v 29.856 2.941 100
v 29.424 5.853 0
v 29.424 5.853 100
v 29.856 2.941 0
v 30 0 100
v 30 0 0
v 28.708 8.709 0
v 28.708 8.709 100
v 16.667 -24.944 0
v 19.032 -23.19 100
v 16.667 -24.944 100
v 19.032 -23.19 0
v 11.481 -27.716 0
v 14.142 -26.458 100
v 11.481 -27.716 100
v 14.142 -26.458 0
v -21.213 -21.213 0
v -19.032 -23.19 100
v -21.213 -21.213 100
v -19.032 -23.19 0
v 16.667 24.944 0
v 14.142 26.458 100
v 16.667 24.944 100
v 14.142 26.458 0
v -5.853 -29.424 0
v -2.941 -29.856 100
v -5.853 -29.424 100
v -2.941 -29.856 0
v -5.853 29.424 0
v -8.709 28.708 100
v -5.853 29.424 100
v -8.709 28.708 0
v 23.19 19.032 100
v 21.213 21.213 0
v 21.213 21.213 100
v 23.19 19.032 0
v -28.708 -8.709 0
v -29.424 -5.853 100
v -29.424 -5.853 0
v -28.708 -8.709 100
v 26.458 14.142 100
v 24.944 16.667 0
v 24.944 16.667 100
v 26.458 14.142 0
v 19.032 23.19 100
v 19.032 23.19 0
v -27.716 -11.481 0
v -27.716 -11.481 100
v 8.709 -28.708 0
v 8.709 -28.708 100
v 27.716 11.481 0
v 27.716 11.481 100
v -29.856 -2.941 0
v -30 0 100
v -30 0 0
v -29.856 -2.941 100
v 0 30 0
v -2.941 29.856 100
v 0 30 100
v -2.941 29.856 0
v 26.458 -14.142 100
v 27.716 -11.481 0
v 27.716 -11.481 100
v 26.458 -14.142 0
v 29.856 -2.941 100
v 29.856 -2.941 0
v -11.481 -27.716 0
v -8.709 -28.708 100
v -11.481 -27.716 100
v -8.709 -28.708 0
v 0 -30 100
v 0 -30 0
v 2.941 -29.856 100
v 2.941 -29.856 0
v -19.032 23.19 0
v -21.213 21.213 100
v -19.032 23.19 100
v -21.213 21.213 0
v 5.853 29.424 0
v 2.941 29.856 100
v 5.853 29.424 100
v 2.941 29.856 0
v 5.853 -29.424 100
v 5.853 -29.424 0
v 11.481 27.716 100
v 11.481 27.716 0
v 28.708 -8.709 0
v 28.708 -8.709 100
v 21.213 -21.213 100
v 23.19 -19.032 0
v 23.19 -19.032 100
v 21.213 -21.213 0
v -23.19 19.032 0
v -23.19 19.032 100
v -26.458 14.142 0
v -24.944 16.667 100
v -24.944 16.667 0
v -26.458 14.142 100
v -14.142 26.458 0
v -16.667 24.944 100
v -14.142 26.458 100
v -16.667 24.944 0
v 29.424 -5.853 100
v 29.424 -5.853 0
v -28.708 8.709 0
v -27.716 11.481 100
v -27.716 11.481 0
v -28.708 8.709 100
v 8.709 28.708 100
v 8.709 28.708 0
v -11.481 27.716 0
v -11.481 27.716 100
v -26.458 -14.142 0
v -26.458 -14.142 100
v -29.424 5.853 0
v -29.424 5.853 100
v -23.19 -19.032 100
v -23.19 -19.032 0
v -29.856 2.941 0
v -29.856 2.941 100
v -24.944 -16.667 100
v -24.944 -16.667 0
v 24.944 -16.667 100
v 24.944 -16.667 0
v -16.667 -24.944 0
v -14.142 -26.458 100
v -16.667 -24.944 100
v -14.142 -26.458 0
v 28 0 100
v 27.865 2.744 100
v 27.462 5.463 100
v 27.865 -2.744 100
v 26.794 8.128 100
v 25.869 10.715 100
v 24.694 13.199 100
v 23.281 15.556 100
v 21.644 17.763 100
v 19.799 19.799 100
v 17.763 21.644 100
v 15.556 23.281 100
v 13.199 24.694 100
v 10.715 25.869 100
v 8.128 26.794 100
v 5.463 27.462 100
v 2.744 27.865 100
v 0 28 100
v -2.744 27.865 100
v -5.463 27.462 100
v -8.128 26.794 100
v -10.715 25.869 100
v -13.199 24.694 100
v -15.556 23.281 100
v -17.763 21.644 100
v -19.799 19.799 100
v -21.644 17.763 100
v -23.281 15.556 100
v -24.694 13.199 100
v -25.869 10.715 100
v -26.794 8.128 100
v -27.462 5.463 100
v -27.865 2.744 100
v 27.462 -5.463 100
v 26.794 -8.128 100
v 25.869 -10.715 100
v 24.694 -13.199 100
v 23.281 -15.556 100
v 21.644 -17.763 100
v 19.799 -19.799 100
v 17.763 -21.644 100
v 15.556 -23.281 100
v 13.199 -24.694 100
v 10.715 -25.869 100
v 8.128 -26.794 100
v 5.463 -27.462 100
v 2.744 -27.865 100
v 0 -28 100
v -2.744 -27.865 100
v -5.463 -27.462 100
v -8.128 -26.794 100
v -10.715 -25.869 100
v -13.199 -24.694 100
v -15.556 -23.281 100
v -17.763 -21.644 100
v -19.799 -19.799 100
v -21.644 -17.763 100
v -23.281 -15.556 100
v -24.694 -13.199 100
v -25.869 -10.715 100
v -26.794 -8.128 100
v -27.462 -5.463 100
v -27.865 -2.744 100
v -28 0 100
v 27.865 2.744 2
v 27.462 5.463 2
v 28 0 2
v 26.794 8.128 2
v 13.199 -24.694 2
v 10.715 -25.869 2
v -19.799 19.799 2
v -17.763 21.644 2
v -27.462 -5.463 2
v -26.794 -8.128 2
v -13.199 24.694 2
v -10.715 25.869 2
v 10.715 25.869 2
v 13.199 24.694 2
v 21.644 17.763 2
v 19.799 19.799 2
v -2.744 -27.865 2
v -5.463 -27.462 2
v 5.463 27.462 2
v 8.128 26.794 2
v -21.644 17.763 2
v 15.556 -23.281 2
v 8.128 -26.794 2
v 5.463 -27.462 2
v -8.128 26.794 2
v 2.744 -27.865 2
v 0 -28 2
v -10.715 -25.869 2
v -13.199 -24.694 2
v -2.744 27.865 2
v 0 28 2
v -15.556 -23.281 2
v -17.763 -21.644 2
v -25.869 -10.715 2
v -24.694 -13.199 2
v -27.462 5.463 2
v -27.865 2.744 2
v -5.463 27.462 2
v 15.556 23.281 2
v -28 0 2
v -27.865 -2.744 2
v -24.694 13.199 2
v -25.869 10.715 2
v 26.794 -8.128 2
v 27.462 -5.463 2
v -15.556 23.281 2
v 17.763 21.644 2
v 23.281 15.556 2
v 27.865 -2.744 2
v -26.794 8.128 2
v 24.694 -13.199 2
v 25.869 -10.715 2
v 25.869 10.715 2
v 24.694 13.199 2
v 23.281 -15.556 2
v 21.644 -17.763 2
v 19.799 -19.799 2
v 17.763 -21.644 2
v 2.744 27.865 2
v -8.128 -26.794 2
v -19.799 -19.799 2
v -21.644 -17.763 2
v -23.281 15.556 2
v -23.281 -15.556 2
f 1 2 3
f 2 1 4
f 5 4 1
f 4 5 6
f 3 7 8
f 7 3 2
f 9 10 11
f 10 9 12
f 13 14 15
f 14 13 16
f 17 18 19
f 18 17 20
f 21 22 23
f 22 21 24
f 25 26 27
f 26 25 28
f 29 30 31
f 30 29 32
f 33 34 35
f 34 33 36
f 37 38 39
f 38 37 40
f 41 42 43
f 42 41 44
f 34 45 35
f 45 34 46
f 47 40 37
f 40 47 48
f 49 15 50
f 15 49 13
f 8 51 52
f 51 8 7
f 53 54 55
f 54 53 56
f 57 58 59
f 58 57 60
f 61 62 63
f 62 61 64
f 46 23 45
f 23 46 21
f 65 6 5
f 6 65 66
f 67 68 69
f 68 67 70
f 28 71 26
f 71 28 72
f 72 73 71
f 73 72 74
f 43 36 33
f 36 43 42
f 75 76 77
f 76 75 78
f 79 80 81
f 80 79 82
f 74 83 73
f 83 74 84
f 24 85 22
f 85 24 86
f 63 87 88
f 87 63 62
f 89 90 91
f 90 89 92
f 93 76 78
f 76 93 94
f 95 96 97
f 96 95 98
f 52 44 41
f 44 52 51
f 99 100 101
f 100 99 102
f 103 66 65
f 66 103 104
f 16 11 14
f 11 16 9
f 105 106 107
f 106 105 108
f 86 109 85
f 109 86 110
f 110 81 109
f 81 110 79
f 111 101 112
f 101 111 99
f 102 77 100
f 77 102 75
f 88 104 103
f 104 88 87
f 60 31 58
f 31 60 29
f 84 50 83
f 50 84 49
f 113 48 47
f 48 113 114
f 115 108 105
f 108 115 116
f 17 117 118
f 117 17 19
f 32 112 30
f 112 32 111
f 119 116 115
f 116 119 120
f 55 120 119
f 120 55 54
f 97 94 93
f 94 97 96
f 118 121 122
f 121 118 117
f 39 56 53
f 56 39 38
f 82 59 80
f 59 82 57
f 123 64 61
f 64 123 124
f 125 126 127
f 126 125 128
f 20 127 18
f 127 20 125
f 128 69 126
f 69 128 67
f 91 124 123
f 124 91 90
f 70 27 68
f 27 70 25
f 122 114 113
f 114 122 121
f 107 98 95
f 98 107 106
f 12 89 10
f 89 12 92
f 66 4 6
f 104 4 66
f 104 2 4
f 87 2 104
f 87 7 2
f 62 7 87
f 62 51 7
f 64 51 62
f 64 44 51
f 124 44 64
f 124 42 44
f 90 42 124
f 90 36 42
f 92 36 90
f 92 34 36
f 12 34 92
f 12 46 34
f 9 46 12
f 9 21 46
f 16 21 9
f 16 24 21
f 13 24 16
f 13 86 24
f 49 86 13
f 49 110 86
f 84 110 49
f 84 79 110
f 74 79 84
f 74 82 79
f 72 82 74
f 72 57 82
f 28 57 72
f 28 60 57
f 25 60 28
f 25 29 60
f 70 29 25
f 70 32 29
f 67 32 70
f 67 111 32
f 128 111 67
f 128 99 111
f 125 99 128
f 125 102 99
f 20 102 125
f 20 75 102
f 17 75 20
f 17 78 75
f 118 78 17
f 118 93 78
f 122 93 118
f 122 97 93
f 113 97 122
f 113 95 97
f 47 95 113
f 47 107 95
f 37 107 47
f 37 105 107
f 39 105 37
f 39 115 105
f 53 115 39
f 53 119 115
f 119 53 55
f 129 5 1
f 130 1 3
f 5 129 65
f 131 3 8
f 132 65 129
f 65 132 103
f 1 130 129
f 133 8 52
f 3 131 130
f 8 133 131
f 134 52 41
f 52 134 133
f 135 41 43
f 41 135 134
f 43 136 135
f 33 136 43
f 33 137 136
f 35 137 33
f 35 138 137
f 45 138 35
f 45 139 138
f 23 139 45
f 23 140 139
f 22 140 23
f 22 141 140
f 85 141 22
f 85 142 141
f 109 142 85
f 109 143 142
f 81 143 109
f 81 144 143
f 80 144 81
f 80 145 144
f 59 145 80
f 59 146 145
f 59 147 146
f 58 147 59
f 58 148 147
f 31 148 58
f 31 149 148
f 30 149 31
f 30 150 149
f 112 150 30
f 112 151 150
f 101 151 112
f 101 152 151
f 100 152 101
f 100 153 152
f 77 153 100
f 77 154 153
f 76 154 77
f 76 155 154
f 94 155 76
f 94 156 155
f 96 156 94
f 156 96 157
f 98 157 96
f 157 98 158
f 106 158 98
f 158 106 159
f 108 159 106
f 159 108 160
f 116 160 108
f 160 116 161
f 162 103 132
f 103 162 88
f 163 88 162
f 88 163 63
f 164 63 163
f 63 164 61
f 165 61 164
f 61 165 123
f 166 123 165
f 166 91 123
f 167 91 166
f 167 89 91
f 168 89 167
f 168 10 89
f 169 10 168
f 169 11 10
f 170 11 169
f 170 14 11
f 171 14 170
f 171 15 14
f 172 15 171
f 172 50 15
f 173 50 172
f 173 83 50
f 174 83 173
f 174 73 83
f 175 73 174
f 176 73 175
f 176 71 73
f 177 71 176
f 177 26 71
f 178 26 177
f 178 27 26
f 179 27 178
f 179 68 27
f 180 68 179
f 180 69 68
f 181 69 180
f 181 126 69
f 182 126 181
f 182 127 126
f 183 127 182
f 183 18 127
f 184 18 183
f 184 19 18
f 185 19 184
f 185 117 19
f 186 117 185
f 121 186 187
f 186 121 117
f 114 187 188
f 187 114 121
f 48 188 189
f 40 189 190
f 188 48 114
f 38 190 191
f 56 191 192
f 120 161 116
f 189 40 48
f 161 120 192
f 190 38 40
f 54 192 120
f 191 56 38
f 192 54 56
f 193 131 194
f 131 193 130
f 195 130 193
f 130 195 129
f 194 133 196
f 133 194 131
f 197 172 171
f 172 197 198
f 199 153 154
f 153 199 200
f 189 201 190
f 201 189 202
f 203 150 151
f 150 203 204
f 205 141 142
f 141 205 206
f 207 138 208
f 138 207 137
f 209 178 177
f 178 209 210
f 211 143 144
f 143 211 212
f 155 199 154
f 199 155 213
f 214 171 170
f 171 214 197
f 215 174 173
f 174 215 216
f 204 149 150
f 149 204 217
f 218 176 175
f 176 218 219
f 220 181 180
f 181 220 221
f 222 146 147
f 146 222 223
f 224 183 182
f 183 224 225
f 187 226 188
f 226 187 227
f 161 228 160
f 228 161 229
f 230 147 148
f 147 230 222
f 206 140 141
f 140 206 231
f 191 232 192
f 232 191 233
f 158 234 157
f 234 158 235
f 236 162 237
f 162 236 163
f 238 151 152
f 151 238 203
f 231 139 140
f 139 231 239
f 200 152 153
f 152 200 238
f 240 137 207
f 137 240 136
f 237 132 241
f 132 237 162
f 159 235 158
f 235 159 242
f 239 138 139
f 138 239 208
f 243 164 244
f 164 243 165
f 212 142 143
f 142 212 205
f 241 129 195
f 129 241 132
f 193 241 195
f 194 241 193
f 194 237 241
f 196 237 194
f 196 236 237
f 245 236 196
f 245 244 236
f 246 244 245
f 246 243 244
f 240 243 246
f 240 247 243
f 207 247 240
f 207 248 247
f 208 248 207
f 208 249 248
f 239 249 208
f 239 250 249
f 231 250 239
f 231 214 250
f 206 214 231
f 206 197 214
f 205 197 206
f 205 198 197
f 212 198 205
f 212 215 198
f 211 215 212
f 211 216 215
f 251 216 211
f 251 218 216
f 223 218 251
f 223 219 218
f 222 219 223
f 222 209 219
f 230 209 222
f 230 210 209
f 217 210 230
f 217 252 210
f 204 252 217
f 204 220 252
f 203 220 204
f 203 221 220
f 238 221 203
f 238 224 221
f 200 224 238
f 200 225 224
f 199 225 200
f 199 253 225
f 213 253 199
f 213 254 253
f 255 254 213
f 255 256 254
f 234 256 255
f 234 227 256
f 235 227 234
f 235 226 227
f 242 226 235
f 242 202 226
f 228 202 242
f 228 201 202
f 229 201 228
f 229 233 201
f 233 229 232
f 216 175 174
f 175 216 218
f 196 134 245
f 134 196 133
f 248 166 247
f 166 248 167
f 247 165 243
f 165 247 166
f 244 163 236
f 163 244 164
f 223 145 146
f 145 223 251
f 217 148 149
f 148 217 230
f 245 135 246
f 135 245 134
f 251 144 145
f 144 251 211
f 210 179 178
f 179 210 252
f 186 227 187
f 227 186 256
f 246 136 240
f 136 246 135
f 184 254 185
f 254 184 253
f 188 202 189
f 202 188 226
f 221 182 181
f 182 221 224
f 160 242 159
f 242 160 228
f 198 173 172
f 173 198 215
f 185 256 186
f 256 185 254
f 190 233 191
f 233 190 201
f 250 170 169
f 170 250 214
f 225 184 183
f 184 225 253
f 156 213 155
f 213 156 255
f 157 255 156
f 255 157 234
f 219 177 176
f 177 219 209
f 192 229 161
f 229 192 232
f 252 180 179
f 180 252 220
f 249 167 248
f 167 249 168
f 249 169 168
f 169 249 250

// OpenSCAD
// Parametric Cylinder/Cup Template
// Cylindrical container (pencil holder, cup, etc.)

$fn = 64;

// Parameters
diameter = 60;   // mm
height = 100;    // mm
wall = 2;        // mm

// Base cylinder
module cylinder_cup() {
    difference() {
        // Outer cylinder
        cylinder(h=height, d=diameter);
        
        // Inner cavity
        translate([0, 0, wall])
            cylinder(h=height, d=diameter - 2*wall);
    }
}

cylinder_cup();
